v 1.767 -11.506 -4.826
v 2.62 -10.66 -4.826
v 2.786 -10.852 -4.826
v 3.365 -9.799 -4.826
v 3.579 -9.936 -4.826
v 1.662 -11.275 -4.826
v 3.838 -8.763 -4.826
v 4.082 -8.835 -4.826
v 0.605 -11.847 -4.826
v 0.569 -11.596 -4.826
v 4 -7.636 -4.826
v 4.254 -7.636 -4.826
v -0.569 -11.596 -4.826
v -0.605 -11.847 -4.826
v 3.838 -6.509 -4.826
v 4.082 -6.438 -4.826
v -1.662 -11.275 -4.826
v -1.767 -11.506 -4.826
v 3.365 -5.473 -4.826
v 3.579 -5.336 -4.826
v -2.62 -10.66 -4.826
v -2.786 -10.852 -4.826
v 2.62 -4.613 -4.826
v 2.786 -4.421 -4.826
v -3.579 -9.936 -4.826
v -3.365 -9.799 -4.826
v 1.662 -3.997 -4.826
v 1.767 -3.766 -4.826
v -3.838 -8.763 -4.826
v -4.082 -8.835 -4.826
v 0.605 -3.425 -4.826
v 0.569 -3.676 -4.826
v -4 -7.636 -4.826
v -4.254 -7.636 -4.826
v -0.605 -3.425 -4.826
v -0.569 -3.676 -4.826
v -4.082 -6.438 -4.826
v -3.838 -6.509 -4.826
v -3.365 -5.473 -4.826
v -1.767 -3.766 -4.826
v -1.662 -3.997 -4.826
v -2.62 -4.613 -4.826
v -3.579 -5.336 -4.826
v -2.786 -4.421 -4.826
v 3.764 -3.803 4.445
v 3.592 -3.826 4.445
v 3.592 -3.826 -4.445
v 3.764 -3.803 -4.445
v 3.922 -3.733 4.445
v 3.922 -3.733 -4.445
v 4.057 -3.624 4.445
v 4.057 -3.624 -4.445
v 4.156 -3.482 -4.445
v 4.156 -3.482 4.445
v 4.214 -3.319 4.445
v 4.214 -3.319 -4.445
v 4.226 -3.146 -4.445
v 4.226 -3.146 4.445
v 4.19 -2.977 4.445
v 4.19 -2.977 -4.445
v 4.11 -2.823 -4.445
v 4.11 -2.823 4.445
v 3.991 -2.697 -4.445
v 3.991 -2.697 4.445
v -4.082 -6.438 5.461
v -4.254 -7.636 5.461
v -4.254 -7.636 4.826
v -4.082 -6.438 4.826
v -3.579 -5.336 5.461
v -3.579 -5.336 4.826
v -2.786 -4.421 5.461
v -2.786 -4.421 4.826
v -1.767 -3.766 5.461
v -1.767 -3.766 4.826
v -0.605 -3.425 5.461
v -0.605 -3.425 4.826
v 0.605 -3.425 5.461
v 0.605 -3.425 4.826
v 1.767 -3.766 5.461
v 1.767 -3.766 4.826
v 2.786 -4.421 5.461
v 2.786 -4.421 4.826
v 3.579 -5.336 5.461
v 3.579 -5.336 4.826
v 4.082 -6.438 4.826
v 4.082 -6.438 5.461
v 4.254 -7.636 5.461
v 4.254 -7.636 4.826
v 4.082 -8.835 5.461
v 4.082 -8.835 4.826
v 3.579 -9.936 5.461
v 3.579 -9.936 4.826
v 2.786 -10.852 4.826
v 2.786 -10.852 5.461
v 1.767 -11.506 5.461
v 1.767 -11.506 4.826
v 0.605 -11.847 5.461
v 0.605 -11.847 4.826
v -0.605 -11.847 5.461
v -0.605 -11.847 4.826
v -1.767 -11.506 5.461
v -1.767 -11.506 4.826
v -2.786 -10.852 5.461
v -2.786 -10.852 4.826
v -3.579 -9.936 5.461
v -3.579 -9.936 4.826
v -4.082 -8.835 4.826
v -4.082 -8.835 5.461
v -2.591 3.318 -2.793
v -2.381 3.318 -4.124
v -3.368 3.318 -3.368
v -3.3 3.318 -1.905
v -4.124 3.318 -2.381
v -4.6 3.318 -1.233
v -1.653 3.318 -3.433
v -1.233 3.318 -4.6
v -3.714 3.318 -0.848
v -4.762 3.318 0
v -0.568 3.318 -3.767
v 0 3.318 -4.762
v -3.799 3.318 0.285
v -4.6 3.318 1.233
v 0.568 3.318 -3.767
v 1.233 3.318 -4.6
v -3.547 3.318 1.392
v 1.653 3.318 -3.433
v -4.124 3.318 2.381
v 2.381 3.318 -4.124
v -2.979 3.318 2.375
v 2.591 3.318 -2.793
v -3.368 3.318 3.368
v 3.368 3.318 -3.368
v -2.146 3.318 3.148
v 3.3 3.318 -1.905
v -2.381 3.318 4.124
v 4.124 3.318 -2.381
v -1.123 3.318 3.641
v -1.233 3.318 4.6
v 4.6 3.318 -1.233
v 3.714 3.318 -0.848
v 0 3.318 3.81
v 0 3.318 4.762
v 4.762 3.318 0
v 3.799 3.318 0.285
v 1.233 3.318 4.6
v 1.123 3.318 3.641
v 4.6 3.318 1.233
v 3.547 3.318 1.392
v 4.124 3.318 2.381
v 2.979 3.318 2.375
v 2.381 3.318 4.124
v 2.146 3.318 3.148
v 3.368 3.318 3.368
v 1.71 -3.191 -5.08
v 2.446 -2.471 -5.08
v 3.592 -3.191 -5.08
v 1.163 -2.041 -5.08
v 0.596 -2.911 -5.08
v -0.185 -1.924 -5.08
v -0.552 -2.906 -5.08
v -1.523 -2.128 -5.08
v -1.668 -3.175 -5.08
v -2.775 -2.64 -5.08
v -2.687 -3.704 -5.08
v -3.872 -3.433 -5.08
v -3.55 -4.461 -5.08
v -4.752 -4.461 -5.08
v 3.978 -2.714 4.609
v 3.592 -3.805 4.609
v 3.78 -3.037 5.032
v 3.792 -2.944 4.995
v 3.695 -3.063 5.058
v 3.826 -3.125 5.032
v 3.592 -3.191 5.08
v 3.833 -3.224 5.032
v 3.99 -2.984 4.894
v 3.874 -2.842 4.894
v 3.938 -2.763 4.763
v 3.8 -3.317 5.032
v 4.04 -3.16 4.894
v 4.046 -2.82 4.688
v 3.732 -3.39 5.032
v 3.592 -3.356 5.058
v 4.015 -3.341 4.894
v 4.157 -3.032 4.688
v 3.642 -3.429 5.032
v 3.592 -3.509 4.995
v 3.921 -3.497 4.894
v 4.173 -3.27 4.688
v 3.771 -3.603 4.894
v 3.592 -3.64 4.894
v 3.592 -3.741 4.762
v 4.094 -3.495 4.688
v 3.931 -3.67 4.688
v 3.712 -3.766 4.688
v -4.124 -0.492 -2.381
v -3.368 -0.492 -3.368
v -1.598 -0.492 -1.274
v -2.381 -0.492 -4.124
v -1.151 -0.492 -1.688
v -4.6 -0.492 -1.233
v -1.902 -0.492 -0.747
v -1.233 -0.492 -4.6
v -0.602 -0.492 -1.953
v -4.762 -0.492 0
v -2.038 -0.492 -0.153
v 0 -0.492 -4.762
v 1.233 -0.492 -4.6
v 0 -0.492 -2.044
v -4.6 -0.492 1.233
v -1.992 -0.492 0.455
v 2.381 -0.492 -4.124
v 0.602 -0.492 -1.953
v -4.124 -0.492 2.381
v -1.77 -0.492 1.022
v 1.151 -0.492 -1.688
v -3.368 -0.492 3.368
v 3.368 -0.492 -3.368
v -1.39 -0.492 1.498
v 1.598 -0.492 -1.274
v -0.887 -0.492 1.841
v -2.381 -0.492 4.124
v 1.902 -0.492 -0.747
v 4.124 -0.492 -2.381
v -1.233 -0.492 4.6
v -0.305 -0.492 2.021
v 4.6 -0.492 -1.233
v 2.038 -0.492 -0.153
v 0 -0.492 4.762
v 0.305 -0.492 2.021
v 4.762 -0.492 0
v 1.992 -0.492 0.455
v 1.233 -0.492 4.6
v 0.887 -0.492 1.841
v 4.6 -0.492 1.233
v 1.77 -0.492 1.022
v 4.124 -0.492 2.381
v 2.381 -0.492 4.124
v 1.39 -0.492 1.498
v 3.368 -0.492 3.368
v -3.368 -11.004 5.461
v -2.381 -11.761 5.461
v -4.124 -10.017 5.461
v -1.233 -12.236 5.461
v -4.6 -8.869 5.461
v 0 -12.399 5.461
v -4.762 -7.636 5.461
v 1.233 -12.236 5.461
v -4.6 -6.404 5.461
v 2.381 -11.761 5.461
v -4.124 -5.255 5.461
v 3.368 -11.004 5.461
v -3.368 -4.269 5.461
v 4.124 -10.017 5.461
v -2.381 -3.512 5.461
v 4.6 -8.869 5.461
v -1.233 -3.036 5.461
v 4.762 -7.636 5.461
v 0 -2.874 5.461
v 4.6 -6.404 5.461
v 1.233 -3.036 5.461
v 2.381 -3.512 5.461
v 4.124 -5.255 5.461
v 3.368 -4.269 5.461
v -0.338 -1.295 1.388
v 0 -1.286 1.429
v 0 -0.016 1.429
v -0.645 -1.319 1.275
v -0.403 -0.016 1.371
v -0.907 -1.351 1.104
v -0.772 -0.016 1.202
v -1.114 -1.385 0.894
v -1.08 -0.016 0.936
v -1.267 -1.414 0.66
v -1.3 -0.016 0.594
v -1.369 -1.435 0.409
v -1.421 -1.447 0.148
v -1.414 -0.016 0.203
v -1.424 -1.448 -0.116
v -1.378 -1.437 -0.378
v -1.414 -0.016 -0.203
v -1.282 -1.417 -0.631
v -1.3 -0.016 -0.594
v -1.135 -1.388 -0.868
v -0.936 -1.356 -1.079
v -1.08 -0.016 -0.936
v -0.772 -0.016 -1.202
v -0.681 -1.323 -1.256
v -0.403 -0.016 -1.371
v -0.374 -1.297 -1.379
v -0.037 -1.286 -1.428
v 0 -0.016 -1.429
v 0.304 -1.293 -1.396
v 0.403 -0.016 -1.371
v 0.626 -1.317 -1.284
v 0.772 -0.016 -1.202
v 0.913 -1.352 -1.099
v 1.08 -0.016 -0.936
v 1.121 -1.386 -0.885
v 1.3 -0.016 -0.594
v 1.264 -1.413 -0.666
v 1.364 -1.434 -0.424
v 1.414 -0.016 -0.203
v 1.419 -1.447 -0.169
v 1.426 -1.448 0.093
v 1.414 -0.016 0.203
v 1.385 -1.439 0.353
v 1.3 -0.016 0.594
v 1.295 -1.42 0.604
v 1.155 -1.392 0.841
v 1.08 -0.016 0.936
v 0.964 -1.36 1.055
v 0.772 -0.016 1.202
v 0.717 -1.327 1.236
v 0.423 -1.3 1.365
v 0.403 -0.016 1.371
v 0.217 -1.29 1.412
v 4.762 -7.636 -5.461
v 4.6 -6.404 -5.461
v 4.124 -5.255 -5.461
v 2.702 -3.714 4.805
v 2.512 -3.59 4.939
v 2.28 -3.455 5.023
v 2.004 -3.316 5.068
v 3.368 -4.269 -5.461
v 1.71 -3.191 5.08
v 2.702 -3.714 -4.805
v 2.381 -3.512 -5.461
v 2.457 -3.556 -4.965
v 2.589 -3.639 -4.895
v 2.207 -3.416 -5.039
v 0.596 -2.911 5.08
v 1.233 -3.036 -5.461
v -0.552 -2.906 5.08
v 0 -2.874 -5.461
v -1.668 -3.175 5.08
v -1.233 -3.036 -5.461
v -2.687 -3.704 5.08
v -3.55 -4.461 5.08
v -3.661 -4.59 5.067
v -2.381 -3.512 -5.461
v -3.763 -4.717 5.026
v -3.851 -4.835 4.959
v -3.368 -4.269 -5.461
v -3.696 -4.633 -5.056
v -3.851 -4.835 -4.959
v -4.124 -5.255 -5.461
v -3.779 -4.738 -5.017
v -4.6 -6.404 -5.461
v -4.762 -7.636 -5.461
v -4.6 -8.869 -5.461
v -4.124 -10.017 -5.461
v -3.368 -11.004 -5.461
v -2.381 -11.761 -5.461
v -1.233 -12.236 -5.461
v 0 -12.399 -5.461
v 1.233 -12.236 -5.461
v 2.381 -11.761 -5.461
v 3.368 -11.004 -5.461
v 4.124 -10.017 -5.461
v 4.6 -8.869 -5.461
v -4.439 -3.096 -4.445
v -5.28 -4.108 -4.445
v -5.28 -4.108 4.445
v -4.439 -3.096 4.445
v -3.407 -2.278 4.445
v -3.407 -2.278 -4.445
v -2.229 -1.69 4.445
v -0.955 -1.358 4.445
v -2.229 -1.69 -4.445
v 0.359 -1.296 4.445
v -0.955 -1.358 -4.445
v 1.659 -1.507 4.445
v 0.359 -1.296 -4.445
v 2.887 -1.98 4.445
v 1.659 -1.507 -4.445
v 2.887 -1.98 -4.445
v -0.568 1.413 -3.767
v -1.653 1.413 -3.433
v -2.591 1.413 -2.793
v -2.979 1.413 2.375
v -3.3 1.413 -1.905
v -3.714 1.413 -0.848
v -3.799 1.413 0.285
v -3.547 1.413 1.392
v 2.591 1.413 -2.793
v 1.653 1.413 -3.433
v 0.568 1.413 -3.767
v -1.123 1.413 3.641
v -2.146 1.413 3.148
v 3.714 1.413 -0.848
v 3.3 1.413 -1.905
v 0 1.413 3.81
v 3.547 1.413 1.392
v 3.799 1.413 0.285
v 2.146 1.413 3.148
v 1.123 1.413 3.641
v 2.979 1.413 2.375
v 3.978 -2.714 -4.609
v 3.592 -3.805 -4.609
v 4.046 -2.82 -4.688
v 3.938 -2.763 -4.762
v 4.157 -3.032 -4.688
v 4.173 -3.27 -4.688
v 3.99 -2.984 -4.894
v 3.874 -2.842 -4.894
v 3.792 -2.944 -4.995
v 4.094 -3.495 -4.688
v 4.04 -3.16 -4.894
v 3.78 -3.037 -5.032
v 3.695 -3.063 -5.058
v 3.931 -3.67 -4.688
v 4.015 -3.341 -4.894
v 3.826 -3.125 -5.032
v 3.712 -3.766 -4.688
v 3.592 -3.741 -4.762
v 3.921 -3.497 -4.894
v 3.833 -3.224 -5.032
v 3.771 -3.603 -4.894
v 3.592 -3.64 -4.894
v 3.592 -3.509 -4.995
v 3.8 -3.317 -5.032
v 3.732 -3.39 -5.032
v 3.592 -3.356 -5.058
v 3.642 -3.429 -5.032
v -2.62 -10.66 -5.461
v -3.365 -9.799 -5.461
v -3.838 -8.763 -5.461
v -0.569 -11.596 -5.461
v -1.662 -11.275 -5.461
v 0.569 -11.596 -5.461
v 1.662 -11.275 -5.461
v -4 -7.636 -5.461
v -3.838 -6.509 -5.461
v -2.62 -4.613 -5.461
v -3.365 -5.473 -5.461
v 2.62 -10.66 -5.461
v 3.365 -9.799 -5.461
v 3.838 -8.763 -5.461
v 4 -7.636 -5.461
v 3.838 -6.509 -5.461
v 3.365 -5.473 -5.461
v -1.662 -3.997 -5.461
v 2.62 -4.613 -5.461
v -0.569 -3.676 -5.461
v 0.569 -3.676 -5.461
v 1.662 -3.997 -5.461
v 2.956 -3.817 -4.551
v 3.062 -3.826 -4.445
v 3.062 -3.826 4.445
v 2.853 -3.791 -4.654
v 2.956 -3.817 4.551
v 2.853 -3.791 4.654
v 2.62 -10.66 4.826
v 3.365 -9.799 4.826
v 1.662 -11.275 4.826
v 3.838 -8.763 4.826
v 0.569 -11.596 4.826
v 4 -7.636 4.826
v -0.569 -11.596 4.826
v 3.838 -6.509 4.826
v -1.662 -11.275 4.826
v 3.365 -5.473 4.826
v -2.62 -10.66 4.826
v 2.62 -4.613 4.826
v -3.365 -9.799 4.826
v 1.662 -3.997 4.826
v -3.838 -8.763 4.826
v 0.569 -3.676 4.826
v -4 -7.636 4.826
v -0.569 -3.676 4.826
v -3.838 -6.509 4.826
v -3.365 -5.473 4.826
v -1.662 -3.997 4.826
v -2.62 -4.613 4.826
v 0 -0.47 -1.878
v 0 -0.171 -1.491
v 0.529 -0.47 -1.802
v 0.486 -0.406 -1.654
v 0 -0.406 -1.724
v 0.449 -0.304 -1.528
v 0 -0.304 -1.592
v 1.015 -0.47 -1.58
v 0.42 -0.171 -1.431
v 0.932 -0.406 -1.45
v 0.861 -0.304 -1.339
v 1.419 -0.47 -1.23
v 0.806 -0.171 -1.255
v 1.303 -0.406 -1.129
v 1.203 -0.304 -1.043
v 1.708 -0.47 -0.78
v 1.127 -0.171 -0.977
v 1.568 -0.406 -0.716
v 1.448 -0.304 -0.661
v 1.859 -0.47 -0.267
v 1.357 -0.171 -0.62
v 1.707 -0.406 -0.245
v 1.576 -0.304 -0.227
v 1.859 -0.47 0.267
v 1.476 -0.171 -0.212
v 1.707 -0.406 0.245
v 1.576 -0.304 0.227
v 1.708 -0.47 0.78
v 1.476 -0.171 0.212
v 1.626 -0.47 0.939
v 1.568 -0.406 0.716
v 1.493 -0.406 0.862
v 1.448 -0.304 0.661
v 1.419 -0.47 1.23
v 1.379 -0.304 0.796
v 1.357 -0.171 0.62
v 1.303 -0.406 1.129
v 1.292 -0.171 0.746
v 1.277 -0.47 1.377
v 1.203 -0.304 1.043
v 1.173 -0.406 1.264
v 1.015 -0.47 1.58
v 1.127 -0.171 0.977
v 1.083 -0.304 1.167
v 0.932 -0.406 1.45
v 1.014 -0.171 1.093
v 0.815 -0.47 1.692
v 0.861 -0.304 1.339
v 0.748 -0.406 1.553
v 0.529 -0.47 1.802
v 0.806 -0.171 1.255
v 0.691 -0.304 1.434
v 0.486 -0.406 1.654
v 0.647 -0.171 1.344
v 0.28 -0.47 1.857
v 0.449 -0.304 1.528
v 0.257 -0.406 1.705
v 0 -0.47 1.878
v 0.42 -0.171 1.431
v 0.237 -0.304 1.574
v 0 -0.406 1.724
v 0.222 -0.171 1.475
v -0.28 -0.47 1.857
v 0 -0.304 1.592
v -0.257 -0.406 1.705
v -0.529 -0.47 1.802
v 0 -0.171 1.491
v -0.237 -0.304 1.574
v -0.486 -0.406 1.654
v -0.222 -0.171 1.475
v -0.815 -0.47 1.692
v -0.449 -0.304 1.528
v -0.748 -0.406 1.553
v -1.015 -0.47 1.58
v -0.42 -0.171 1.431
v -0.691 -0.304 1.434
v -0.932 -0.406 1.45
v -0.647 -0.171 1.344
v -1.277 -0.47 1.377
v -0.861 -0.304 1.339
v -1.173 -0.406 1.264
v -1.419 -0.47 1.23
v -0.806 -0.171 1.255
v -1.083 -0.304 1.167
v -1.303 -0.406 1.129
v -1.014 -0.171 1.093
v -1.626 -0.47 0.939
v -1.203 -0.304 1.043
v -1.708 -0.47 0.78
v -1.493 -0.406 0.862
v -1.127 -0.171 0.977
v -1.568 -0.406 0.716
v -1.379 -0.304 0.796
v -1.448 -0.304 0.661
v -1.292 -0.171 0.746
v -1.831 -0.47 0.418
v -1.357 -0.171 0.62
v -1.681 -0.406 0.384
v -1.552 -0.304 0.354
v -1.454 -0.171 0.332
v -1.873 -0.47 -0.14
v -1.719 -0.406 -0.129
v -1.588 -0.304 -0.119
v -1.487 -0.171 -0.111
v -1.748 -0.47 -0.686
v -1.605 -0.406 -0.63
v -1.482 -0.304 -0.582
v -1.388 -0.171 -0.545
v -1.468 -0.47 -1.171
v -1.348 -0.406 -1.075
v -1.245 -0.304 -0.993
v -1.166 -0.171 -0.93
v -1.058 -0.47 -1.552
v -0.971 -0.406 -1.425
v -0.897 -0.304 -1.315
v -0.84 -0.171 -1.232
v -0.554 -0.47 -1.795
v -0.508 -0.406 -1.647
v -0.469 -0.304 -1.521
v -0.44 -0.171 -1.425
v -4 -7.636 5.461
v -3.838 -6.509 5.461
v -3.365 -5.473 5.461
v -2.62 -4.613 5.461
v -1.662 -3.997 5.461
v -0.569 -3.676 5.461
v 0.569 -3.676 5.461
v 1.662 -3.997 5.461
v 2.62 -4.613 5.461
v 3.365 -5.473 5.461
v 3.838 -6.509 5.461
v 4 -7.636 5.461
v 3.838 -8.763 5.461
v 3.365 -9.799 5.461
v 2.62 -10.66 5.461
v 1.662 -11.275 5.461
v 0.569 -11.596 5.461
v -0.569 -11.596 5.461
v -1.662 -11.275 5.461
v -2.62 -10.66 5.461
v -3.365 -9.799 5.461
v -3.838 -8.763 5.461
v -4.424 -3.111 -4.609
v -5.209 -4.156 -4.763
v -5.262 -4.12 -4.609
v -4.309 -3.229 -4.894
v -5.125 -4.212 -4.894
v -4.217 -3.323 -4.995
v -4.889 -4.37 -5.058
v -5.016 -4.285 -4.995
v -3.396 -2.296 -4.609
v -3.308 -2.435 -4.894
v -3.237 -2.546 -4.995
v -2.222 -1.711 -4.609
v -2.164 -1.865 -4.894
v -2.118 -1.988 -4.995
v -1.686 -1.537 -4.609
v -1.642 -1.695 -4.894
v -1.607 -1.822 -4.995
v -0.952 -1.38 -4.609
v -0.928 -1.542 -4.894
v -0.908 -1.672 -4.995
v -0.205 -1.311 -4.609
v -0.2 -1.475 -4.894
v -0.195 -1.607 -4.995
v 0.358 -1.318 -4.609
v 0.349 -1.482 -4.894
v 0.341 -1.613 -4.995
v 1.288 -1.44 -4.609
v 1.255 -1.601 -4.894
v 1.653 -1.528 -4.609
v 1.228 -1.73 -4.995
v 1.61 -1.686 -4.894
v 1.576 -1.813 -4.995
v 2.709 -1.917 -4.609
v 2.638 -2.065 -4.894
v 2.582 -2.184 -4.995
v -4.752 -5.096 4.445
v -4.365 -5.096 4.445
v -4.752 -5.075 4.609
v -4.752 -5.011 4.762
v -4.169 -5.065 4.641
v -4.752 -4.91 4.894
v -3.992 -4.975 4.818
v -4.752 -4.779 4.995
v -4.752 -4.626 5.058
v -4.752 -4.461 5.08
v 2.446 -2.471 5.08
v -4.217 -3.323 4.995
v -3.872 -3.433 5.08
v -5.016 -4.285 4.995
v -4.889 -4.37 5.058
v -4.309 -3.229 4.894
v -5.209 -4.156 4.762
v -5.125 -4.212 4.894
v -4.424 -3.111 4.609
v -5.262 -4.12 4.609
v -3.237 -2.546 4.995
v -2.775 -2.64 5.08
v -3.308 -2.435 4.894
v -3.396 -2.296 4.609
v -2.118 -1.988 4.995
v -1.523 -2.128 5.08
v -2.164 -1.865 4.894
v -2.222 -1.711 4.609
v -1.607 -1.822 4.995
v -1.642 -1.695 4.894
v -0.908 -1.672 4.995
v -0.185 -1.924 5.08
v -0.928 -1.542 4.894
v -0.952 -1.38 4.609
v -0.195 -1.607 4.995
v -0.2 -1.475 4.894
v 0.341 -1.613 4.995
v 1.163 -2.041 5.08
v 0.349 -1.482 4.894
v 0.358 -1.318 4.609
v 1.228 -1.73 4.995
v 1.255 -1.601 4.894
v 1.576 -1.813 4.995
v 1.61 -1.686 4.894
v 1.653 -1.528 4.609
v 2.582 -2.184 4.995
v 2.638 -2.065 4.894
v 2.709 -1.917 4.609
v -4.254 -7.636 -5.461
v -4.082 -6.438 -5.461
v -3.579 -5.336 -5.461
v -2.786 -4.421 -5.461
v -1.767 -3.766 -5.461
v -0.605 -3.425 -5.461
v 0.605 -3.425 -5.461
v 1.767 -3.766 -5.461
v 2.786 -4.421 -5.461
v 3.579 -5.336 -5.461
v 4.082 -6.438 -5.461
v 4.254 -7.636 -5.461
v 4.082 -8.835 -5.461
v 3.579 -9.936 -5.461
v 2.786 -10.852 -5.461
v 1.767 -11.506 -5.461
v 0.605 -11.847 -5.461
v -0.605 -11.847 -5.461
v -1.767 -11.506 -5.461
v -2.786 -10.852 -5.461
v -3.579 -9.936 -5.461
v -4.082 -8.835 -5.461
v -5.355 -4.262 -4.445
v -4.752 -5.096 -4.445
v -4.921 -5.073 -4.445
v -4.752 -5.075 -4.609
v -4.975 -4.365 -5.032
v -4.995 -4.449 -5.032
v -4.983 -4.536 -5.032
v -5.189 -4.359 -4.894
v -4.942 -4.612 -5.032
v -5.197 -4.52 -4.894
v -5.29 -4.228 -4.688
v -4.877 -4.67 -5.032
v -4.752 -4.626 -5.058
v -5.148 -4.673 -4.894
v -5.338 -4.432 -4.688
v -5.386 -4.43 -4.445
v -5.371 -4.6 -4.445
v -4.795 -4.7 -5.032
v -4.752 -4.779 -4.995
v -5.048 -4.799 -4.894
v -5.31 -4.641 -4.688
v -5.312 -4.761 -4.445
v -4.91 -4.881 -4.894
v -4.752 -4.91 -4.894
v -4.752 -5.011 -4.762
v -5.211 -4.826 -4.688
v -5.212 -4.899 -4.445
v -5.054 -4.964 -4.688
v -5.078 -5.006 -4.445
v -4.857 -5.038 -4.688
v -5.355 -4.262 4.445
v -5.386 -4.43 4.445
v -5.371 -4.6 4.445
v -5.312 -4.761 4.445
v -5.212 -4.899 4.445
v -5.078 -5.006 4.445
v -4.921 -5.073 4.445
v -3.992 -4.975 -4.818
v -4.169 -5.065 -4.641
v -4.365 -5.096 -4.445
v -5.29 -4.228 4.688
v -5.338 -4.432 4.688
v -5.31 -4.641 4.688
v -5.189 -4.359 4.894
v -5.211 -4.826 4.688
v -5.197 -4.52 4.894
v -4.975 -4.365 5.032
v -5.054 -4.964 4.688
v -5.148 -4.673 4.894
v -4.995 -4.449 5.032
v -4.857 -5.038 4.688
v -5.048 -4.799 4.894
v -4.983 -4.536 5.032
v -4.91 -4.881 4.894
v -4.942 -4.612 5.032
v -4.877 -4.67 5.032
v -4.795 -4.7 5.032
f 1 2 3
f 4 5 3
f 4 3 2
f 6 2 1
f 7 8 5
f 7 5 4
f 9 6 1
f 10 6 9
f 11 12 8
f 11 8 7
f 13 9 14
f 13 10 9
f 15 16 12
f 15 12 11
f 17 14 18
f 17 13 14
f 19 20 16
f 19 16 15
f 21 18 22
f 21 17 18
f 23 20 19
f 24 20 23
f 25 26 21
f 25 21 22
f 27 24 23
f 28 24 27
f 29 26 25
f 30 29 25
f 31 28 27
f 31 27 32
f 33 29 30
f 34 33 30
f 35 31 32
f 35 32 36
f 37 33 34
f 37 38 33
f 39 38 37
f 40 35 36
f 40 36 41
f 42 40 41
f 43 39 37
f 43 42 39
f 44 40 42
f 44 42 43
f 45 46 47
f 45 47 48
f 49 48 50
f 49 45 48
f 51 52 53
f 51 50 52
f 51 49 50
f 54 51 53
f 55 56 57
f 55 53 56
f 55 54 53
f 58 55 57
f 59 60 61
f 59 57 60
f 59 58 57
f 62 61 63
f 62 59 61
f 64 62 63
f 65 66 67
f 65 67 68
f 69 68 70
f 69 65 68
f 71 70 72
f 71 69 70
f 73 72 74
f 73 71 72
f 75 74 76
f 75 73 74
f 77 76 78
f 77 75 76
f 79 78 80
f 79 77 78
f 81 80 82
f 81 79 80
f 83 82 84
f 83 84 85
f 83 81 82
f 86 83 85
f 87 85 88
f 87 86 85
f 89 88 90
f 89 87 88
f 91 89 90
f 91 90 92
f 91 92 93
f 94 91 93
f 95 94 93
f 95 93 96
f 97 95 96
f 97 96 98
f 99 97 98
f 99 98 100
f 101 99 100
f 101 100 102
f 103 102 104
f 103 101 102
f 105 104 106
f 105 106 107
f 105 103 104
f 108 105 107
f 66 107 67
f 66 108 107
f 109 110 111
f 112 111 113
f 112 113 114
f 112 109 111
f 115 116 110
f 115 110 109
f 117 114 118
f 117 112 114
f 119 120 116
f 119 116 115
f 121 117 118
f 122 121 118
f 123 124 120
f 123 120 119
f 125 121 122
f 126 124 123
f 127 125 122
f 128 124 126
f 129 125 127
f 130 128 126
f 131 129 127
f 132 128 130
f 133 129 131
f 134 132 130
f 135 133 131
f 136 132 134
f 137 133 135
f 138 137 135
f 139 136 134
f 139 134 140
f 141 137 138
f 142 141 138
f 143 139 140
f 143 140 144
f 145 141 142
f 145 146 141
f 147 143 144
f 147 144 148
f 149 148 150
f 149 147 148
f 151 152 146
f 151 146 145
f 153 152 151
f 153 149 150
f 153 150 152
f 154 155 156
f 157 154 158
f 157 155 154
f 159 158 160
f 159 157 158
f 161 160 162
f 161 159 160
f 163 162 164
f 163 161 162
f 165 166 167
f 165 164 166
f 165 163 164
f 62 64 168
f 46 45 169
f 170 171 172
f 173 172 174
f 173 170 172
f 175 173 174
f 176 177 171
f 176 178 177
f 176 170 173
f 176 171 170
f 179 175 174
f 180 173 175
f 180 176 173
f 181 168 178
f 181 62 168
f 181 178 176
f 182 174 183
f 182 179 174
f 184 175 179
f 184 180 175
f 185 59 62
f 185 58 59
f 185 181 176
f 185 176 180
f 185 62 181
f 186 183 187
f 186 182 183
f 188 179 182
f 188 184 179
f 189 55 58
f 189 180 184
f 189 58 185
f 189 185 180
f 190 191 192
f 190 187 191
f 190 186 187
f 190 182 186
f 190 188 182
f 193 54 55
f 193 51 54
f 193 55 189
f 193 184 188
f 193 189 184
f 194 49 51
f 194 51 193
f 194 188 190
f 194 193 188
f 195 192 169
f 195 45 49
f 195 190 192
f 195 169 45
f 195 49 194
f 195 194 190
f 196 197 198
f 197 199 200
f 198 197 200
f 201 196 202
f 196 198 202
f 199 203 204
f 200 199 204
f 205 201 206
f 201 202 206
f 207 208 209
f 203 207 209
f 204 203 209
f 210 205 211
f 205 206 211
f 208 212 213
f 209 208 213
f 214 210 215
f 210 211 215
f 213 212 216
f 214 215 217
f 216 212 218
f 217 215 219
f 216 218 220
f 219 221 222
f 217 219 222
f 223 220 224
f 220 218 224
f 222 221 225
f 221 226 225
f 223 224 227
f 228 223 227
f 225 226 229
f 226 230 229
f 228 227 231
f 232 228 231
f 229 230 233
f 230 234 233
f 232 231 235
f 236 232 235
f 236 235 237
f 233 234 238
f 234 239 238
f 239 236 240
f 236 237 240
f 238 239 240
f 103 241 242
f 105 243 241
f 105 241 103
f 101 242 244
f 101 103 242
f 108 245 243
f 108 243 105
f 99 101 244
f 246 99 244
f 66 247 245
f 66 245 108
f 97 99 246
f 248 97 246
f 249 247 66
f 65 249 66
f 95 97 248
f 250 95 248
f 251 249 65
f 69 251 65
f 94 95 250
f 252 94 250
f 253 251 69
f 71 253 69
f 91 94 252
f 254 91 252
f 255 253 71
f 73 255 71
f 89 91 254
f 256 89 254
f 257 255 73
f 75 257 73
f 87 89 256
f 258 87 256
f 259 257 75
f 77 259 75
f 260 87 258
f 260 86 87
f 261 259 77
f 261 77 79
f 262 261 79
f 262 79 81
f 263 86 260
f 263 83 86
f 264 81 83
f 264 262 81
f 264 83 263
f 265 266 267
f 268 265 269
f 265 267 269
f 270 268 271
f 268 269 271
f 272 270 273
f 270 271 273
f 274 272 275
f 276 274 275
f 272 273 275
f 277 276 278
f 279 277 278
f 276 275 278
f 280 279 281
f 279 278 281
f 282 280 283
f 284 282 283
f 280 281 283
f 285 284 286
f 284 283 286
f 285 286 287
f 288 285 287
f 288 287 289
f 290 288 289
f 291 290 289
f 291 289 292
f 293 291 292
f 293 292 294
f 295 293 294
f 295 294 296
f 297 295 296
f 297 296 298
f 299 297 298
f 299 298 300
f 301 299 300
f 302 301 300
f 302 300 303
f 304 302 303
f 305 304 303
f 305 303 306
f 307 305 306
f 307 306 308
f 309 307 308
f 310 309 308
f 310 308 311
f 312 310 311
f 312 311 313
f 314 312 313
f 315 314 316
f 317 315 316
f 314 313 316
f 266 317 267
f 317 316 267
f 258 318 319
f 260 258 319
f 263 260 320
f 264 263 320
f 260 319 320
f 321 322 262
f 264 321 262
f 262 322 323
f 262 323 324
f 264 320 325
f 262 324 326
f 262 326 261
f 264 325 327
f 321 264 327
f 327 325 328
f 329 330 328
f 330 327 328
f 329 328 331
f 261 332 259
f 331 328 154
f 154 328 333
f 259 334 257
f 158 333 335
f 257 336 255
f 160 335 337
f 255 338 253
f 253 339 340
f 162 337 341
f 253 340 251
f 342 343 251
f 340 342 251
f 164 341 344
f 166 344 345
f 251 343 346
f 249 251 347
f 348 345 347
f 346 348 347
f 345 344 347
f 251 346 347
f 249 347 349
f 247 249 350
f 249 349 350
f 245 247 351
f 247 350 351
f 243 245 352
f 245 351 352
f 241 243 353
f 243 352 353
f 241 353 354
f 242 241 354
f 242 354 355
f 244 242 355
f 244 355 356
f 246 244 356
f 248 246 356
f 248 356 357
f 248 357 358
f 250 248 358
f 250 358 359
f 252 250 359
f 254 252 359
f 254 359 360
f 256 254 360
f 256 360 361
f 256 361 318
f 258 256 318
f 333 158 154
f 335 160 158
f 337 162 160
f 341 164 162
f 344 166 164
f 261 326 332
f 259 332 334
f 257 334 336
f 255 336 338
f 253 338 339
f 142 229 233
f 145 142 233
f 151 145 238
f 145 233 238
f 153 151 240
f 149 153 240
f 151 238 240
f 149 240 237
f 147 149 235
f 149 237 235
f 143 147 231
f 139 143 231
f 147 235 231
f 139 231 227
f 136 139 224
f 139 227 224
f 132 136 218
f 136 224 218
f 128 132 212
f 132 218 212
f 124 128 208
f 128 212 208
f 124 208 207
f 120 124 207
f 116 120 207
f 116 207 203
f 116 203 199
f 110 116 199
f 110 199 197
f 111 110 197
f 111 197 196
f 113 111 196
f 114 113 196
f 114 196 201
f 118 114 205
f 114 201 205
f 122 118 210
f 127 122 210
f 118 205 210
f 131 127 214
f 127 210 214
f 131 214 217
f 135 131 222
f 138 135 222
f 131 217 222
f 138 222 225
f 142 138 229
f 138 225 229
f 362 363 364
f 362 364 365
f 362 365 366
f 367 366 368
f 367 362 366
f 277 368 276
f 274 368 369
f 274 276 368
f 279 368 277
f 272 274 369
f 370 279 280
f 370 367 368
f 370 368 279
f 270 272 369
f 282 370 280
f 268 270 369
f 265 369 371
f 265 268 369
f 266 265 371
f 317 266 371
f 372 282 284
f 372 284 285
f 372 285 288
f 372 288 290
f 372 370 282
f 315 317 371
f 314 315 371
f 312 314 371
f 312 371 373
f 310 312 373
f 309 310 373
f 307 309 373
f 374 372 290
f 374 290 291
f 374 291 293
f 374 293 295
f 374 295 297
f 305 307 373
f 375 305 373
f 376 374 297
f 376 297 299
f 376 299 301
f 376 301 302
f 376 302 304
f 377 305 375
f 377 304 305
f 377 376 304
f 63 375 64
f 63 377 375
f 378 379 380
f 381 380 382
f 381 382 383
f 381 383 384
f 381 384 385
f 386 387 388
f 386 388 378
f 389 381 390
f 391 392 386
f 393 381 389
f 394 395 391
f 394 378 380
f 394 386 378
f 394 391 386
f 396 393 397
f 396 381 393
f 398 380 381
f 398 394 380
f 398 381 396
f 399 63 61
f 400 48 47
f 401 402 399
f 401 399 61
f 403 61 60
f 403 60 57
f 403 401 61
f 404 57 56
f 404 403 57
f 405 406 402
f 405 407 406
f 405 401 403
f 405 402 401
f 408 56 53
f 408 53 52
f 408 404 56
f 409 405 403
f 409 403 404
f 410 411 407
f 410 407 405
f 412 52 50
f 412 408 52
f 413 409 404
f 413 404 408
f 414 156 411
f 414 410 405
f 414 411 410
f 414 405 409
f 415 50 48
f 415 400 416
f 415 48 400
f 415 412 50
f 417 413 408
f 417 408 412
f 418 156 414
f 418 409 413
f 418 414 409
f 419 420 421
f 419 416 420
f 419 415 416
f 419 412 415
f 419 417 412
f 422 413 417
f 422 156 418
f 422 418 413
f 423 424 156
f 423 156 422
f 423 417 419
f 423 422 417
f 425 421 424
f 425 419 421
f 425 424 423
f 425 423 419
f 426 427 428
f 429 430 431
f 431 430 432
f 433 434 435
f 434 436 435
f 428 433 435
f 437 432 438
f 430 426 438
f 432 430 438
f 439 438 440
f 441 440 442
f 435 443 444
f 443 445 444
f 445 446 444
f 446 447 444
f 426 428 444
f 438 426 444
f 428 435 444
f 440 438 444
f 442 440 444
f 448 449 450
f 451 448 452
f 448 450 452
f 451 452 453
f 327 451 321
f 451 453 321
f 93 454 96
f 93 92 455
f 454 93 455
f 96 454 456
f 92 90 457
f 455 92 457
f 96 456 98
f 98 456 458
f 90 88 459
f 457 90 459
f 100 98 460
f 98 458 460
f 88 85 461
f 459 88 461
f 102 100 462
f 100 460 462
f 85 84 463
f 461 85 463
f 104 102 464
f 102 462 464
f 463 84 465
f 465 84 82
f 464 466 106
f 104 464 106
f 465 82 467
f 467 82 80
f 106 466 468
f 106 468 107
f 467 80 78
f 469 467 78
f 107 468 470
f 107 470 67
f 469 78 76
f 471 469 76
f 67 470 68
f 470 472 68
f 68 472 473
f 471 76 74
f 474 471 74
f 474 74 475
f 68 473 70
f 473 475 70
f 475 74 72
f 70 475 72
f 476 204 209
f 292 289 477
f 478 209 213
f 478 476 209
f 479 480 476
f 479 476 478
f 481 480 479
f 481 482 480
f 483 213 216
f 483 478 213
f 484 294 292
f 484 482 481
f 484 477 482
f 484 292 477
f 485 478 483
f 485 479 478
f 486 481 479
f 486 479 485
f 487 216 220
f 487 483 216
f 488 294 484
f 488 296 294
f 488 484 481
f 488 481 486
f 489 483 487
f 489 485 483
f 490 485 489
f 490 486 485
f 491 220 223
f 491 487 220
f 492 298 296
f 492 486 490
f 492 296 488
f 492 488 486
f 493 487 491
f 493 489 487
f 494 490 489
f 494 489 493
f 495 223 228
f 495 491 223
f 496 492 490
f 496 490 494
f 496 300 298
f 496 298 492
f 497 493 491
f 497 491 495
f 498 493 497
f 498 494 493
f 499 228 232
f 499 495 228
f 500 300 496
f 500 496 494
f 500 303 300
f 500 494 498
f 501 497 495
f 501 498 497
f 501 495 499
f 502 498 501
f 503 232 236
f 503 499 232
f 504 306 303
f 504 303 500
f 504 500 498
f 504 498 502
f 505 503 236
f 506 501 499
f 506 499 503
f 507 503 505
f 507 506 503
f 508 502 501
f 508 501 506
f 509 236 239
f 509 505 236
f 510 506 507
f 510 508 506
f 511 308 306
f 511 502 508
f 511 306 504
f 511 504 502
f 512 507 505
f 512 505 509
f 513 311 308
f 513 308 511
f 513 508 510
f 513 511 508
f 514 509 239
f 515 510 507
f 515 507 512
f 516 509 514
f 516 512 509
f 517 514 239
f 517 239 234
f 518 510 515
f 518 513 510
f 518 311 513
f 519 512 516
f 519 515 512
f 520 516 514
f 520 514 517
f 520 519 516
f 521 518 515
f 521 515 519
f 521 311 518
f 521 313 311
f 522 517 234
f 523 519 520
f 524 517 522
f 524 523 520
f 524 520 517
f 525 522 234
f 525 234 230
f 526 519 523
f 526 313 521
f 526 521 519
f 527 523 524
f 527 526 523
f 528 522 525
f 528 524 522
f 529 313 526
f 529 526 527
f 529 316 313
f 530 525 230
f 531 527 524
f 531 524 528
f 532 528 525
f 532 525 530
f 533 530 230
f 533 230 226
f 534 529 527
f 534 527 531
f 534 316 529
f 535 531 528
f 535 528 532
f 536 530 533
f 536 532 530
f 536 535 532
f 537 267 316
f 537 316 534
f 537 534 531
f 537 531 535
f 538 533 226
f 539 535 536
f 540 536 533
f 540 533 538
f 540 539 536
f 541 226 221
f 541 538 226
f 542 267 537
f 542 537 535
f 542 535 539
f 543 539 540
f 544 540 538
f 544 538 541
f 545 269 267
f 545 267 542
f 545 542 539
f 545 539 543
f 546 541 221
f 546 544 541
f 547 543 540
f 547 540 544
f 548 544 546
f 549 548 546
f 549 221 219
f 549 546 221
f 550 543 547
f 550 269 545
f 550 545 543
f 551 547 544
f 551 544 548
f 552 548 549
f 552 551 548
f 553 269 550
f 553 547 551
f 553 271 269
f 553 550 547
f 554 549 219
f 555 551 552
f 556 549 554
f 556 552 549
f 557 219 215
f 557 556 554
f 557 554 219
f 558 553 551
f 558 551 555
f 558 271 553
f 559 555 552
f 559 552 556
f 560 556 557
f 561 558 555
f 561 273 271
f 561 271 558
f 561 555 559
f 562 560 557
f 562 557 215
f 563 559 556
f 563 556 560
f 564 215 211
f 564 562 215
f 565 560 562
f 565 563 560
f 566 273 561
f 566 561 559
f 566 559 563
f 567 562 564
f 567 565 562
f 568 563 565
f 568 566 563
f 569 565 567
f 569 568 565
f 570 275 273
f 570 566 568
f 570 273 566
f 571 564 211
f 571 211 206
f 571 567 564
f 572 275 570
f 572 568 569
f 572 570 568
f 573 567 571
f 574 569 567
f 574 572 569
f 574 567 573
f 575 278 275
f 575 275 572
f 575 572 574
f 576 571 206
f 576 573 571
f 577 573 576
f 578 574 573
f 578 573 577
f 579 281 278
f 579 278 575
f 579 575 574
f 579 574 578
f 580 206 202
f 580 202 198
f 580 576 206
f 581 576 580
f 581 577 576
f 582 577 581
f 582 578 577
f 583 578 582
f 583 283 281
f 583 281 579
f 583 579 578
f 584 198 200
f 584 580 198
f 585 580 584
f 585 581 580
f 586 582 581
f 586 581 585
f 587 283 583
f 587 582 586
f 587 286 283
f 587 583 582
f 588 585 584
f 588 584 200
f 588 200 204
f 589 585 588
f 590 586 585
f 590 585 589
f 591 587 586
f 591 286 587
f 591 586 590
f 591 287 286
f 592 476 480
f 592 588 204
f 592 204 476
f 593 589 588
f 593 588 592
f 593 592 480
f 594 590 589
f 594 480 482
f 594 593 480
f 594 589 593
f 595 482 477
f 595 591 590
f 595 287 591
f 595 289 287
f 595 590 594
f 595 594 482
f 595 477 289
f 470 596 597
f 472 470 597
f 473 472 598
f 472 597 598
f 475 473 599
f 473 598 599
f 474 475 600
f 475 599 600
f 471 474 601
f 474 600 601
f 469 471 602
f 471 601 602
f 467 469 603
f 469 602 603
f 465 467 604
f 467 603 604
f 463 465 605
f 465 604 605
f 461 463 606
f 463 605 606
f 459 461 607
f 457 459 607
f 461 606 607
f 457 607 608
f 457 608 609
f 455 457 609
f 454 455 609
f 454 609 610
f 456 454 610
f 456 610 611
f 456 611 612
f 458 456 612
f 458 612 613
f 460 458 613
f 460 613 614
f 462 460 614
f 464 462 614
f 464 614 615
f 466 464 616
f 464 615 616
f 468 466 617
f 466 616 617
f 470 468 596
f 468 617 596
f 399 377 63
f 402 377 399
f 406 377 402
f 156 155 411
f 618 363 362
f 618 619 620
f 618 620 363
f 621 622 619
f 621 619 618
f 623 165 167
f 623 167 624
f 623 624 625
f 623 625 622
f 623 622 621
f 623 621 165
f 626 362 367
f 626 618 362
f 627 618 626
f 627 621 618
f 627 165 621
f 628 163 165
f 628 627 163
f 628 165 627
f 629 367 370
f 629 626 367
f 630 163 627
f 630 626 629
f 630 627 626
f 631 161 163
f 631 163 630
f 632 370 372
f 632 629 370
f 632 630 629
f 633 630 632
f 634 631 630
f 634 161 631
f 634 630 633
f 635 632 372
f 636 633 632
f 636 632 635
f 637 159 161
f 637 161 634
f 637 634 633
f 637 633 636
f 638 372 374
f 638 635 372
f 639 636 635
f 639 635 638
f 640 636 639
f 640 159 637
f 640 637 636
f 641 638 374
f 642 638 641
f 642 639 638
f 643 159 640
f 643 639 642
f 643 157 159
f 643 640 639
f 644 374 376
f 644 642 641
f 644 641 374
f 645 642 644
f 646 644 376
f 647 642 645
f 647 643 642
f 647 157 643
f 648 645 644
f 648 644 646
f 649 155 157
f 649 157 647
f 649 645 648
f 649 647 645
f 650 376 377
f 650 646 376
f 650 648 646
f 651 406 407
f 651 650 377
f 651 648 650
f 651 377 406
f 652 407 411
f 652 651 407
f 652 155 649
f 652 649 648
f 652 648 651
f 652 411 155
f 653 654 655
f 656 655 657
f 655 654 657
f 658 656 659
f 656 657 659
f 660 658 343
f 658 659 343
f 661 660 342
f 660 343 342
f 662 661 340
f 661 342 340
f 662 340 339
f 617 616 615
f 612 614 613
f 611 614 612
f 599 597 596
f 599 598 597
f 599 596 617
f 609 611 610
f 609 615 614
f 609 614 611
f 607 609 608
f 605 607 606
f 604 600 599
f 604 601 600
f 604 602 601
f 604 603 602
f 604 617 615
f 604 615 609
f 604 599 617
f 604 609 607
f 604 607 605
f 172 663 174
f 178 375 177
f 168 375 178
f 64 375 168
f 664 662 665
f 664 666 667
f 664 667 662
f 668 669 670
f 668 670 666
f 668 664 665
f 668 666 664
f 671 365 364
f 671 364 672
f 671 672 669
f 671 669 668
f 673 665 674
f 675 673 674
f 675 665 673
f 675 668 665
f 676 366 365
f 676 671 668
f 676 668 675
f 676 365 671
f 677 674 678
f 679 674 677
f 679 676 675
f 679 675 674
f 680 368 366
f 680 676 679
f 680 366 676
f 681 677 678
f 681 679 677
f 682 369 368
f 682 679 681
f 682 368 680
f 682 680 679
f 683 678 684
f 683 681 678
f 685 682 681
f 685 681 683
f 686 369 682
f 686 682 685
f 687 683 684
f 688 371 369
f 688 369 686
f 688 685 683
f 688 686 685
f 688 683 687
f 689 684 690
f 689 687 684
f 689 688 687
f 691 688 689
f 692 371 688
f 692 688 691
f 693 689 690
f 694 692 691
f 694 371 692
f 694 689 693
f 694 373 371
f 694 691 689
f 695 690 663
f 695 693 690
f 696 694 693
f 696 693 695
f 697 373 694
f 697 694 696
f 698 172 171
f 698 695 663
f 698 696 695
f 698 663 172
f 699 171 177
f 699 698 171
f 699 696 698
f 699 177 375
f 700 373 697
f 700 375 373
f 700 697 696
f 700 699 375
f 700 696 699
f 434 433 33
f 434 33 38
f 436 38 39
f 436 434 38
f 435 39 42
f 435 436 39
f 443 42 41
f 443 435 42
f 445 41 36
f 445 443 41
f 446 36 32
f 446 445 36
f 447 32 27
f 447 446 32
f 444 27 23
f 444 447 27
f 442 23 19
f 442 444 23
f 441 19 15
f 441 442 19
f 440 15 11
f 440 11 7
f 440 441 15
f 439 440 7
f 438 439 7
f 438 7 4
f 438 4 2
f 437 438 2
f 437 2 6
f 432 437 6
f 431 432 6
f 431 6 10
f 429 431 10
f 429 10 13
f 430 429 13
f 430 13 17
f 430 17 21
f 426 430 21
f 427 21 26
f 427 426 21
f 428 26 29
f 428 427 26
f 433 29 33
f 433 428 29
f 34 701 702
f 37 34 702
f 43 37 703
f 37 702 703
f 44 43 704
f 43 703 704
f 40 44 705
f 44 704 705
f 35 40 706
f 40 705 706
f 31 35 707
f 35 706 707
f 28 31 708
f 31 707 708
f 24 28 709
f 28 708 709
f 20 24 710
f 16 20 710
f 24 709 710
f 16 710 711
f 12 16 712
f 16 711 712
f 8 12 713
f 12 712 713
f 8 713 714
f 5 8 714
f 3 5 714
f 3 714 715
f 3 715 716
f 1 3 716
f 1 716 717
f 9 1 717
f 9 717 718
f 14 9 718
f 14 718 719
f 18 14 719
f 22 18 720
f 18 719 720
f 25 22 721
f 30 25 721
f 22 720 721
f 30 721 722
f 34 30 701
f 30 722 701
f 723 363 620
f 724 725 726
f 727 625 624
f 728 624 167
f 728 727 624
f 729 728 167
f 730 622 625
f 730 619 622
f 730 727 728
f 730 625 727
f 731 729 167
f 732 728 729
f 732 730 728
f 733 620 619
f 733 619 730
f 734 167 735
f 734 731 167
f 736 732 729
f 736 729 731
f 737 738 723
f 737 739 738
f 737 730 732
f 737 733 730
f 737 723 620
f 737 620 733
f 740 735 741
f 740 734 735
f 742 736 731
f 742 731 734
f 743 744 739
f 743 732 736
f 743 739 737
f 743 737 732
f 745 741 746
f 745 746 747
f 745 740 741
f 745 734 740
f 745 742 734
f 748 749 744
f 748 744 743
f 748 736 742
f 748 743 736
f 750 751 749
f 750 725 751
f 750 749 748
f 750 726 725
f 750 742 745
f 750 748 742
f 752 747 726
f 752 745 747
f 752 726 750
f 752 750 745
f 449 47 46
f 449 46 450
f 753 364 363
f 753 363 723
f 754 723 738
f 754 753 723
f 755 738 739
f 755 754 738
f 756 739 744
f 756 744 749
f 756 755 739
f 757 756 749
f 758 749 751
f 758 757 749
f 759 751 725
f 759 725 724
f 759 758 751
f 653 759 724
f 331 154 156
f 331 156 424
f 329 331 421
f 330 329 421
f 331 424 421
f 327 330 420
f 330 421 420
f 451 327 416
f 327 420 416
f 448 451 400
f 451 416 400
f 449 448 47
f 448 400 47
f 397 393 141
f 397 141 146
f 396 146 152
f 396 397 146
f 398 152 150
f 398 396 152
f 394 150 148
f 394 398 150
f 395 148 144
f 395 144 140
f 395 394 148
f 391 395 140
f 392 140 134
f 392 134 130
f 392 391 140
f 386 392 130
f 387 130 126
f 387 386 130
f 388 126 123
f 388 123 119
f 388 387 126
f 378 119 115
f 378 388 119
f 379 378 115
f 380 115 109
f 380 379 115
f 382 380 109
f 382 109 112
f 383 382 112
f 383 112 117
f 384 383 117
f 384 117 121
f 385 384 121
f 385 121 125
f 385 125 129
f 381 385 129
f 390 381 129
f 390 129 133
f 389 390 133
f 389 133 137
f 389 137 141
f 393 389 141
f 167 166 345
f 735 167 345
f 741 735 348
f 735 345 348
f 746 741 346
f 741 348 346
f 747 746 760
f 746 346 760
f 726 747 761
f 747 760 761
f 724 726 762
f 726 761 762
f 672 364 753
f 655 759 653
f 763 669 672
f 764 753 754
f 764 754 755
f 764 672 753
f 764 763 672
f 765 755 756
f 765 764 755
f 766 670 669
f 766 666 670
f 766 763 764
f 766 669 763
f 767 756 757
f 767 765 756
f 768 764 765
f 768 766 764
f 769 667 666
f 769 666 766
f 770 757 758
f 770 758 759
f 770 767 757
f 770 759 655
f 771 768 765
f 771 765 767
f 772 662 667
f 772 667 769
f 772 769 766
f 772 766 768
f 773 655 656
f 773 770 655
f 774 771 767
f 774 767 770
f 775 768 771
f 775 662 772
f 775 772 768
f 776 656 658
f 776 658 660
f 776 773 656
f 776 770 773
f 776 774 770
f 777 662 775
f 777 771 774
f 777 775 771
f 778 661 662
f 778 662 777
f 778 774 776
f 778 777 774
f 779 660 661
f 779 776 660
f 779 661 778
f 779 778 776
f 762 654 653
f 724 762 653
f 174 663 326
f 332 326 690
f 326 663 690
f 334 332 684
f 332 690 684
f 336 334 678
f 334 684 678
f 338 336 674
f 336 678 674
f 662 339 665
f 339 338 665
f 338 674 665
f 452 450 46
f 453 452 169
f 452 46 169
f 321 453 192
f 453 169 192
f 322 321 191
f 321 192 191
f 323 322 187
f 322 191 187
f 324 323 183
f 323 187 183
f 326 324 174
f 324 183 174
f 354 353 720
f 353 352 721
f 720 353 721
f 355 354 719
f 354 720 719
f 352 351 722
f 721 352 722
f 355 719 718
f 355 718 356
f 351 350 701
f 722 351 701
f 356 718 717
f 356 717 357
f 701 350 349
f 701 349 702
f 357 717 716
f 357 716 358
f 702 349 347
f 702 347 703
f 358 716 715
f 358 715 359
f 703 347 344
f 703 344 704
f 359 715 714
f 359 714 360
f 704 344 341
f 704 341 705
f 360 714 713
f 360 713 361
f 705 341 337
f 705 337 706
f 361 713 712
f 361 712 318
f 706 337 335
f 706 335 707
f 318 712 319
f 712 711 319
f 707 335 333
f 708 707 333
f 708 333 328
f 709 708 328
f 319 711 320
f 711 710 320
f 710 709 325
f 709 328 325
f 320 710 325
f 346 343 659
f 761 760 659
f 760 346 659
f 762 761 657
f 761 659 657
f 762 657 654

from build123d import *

# Parameters (mm, degrees)
SKETCH1_R                = 2.54
BOSS_EXTRUDE1_DEPTH      = 1.27
SKETCH2_R                = 3.175
SKETCH2_R_2              = 2.54
BOSS_EXTRUDE2_DEPTH      = 2.54
SKETCH3_R                = 0.9525
CUT_EXTRUDE1_DEPTH       = 0.3175
SCALE1_SCALE             = 1.5
FILLET1_R                = 0.635
SKETCH5_R                = 1.42875
BOSS_EXTRUDE3_DEPTH      = 1.905
BOSS_EXTRUDE4_DEPTH      = 5.08
BOSS_EXTRUDE4_DEPTH_BACK = 5.08
FILLET2_R                = 0.635
BOSS_EXTRUDE5_DEPTH      = 5.461
BOSS_EXTRUDE5_DEPTH_BACK = 5.461
SKETCH9_R                = 4.7625
SKETCH10_R               = 4.2545
SKETCH10_R_2             = 4.0005
CUT_EXTRUDE3_DEPTH       = 0.635
FILLET3_R                = 0.635


with BuildPart() as part:
    # Sketch1 → Boss-Extrude1 (new body)
    with BuildSketch(Plane(origin=(0, 0, 0), x_dir=(1, 0, 0), z_dir=(0, 1, 0))):
        with Locations(Location((0, 0, 0), (0, 0, 270))):
            Circle(SKETCH1_R)
    extrude(amount=BOSS_EXTRUDE1_DEPTH)

    # Sketch2 → Boss-Extrude2 (add)
    with BuildSketch(Plane(origin=(0, 0, 0), x_dir=(1, 0, 0), z_dir=(0, 1, 0))):
        with Locations(Location((0, 0, 0), (0, 0, 270))):
            Circle(SKETCH2_R)
        with Locations(Location((0, 0, 0), (0, 0, 270))):
            Circle(SKETCH2_R_2, mode=Mode.SUBTRACT)
    extrude(amount=BOSS_EXTRUDE2_DEPTH)

    # Sketch3 → Cut-Extrude1 (cut)
    with BuildSketch(Plane.XZ):
        with Locations(Location((0, 0, 0), (0, 0, 270))):
            Circle(SKETCH3_R)
    extrude(amount=-CUT_EXTRUDE1_DEPTH, mode=Mode.SUBTRACT)


with BuildPart() as part_1:
    # Scale1: scaled about (0, 0.984843458, 0)
    add(part.part.scale(SCALE1_SCALE).moved(Location((0, -0.492421729, 0))))

    # Fillet1
    # the kernel refuses this fillet: 0.635 mm, written as the material it takes off along each edge
    with BuildSketch(Plane(origin=(0, -0.492421729, 0), x_dir=(0, 0, -1), z_dir=(-1, 0, 0))) as fillet1_piece_1:
        with BuildLine():
            CenterArc((2.043586106, -0.635), FILLET1_R, 90, 75.522487814)
            Line((1.42875, -0.47625), (1.416453278, -0.473075))
            ThreePointArc((1.416453278, -0.473075), (1.41605, -0.238125), (1.41605, 0))
            Line((1.41605, 0), (1.42875, 0.0127))
            Line((1.42875, 0.0127), (2.043586106, 0.0127))
            Line((2.043586106, 0.0127), (2.043586106, 0))
        make_face()
    revolve(axis=Axis((0, -0.492421729, 0), (0, -1, 0)), mode=Mode.SUBTRACT)

    # Sketch5 → Boss-Extrude3 (add)
    with BuildSketch(Plane.XZ.offset(0.016171729)):
        with Locations(Location((0, 0, 0), (0, 0, 90))):
            Circle(SKETCH5_R)
    extrude(amount=BOSS_EXTRUDE3_DEPTH)

    # Sketch7 → Boss-Extrude4 (add, two sides: drawn at the far end of the back side and taken through both)
    with BuildSketch(Plane.XY.offset(-BOSS_EXTRUDE4_DEPTH_BACK)):
        with BuildLine():
            Line((5.08, -3.826171729), (2.8575, -3.826171729))
            ThreePointArc((2.8575, -3.826171729), (-0.863775136, -2.952658223), (-4.028623369, -5.096171729))
            Line((-4.028623369, -5.096171729), (-5.819871133, -5.096171729))
            ThreePointArc((-5.819871133, -5.096171729), (-0.734899533, -1.328840861), (5.08, -3.826171729))
        make_face()
    extrude(amount=BOSS_EXTRUDE4_DEPTH + BOSS_EXTRUDE4_DEPTH_BACK)

    # Fillet2
    fillet2_edges = [part_1.edges().sort_by_distance(p)[0] for p in [
        (-5.819871133, -5.096171729, 0),
        (5.08, -3.826171729, 0),
        (2.8575, -3.826171729, 0),
        (-4.028623369, -5.096171729, 0),
    ]]
    fillet(fillet2_edges, radius=FILLET2_R)

    # Sketch9 → Boss-Extrude5 (add, two sides: drawn at the far end of the back side and taken through both)
    with BuildSketch(Plane.XY.offset(-BOSS_EXTRUDE5_DEPTH_BACK)):
        with Locations((0, -7.636171729)):
            Circle(SKETCH9_R)
    extrude(amount=BOSS_EXTRUDE5_DEPTH + BOSS_EXTRUDE5_DEPTH_BACK)

    # Sketch10 → Cut-Extrude3 (cut)
    with BuildSketch(Plane(origin=(0, 0, -5.461), x_dir=(-1, 0, 0), z_dir=(0, 0, -1))):
        with Locations((0, -7.636171729)):
            Circle(SKETCH10_R)
        with Locations((0, -7.636171729)):
            Circle(SKETCH10_R_2, mode=Mode.SUBTRACT)
    cut_extrude3 = extrude(amount=-CUT_EXTRUDE3_DEPTH, mode=Mode.SUBTRACT)

    # Mirror1: Cut-Extrude3 across plane
    add(cut_extrude3.mirror(Plane.XY), mode=Mode.SUBTRACT)

    # Fillet3
    # the kernel refuses this fillet: 0.635 mm, written as the material it takes off along each edge
    with BuildSketch(Plane(origin=(3.592102448, -3.826171729, 5.08), x_dir=(0, 1, 0), z_dir=(-1, 0, 0))) as fillet3_piece_1_section:
        with BuildLine():
            CenterArc((FILLET3_R, FILLET3_R), FILLET3_R, 180, 90)
            Line((0, FILLET3_R), (0, 0))
            Line((0, 0), (FILLET3_R, 0))
        make_face()
    fillet3_piece_1 = extrude(amount=2.117743332, mode=Mode.PRIVATE)
    fillet3_piece_1 = fillet3_piece_1 - Plane(origin=(0, -7.636171729, 5.008990652), x_dir=(1, 0, 0), z_dir=(0, 0, -1)) * Cylinder(4.7625, 7, mode=Mode.PRIVATE)
    add(fillet3_piece_1, mode=Mode.SUBTRACT)
    with BuildSketch(Plane(origin=(3.592102448, -3.191171729, 5.08), x_dir=(0.6285393610547108, 0.7777777777777762, 0), z_dir=(-0.7777777777777762, 0.6285393610547108, 0))) as fillet3_piece_2:
        with BuildLine():
            CenterArc((0.635 - FILLET3_R, FILLET3_R), FILLET3_R, 270, 90)
            Line((0.635, FILLET3_R), (0.635, 0))
            Line((0.635, 0), (0.635 - FILLET3_R, 0))
        make_face()
    revolve(axis=Axis((3.592102448, -3.191171729, 5.08), (0, 0, -1)), revolution_arc=141.057558731, mode=Mode.SUBTRACT)
    with BuildSketch(Plane(origin=(-2.777403349, -5.096171729, 5.08), x_dir=(0, 1, 0), z_dir=(-1, 0, 0))) as fillet3_piece_3_section:
        with BuildLine():
            CenterArc((FILLET3_R, FILLET3_R), FILLET3_R, 180, 90)
            Line((0, FILLET3_R), (0, 0))
            Line((0, 0), (FILLET3_R, 0))
        make_face()
    fillet3_piece_3 = extrude(amount=1.974501532, mode=Mode.PRIVATE)
    fillet3_piece_3 = fillet3_piece_3 - Plane(origin=(0, -7.636171729, 4.983808313), x_dir=(1, 0, 0), z_dir=(0, 0, -1)) * Cylinder(4.7625, 7, mode=Mode.PRIVATE)
    add(fillet3_piece_3, mode=Mode.SUBTRACT)
    with BuildSketch(Plane(origin=(-4.751904881, -4.461171729, 5.08), x_dir=(-0.8314794192830989, 0.5555555555555544, 0), z_dir=(0.5555555555555544, 0.8314794192830989, 0))) as fillet3_piece_4:
        with BuildLine():
            CenterArc((0.635 - FILLET3_R, -FILLET3_R), FILLET3_R, 0, 90)
            Line((0.635, -FILLET3_R), (0.635, 0))
            Line((0.635, 0), (0.635 - FILLET3_R, 0))
        make_face()
    revolve(axis=Axis((-4.751904881, -4.461171729, 5.08), (0, 0, 1)), revolution_arc=123.748988596, mode=Mode.SUBTRACT)
    with BuildSketch(Plane(origin=(3.592102448, -3.826171729, -5.08), x_dir=(0, 1, 0), z_dir=(-1, 0, 0))) as fillet3_piece_5_section:
        with BuildLine():
            CenterArc((FILLET3_R, -FILLET3_R), FILLET3_R, 90, 90)
            Line((0, -FILLET3_R), (0, 0))
            Line((0, 0), (FILLET3_R, 0))
        make_face()
    fillet3_piece_5 = extrude(amount=2.117743332, mode=Mode.PRIVATE)
    fillet3_piece_5 = fillet3_piece_5 - Plane(origin=(0, -7.636171729, -5.008990652), x_dir=(1, 0, 0), z_dir=(0, 0, -1)) * Cylinder(4.7625, 7, mode=Mode.PRIVATE)
    add(fillet3_piece_5, mode=Mode.SUBTRACT)
    with BuildSketch(Plane(origin=(3.592102448, -3.191171729, -5.08), x_dir=(0.6285393610547108, 0.7777777777777762, 0), z_dir=(-0.7777777777777762, 0.6285393610547108, 0))) as fillet3_piece_6:
        with BuildLine():
            CenterArc((0.635 - FILLET3_R, -FILLET3_R), FILLET3_R, 0, 90)
            Line((0.635 - FILLET3_R, 0), (0.635, 0))
            Line((0.635, 0), (0.635, -FILLET3_R))
        make_face()
    revolve(axis=Axis((3.592102448, -3.191171729, -5.08), (0, 0, -1)), revolution_arc=141.057558731, mode=Mode.SUBTRACT)
    with BuildSketch(Plane(origin=(-2.777403349, -5.096171729, -5.08), x_dir=(0, 1, 0), z_dir=(-1, 0, 0))) as fillet3_piece_7_section:
        with BuildLine():
            CenterArc((FILLET3_R, -FILLET3_R), FILLET3_R, 90, 90)
            Line((0, -FILLET3_R), (0, 0))
            Line((0, 0), (FILLET3_R, 0))
        make_face()
    fillet3_piece_7 = extrude(amount=1.974501532, mode=Mode.PRIVATE)
    fillet3_piece_7 = fillet3_piece_7 - Plane(origin=(0, -7.636171729, -4.983808313), x_dir=(1, 0, 0), z_dir=(0, 0, -1)) * Cylinder(4.7625, 7, mode=Mode.PRIVATE)
    add(fillet3_piece_7, mode=Mode.SUBTRACT)
    with BuildSketch(Plane(origin=(-4.751904881, -4.461171729, -5.08), x_dir=(-0.8314794192830989, 0.5555555555555544, 0), z_dir=(0.5555555555555544, 0.8314794192830989, 0))) as fillet3_piece_8:
        with BuildLine():
            CenterArc((0.635 - FILLET3_R, FILLET3_R), FILLET3_R, 270, 90)
            Line((0.635 - FILLET3_R, 0), (0.635, 0))
            Line((0.635, 0), (0.635, FILLET3_R))
        make_face()
    revolve(axis=Axis((-4.751904881, -4.461171729, -5.08), (0, 0, 1)), revolution_arc=123.748988596, mode=Mode.SUBTRACT)
    with BuildSketch(Plane(origin=(0, -7.636171729, 5.08), x_dir=(-0.8314794192830981, 0.5555555555555554, 0), z_dir=(-0.5555555555555554, -0.8314794192830981, 0))) as fillet3_piece_9:
        with BuildLine():
            CenterArc((6.35 - FILLET3_R, FILLET3_R), FILLET3_R, 270, 90)
            Line((6.35 - FILLET3_R, 0), (6.35, 0))
            Line((6.35, 0), (6.35, FILLET3_R))
        make_face()
    revolve(axis=Axis((0, -7.636171729, 5.08), (0, 0, -1)), revolution_arc=95.193452673, mode=Mode.SUBTRACT)
    with BuildSketch(Plane(origin=(0, -7.636171729, -5.08), x_dir=(-0.8314794192830981, 0.5555555555555554, 0), z_dir=(-0.5555555555555554, -0.8314794192830981, 0))) as fillet3_piece_10:
        with BuildLine():
            CenterArc((6.35 - FILLET3_R, -FILLET3_R), FILLET3_R, 0, 90)
            Line((6.35 - FILLET3_R, 0), (6.35, 0))
            Line((6.35, 0), (6.35, -FILLET3_R))
        make_face()
    revolve(axis=Axis((0, -7.636171729, -5.08), (0, 0, -1)), revolution_arc=95.193452673, mode=Mode.SUBTRACT)


solid = part_1.part
